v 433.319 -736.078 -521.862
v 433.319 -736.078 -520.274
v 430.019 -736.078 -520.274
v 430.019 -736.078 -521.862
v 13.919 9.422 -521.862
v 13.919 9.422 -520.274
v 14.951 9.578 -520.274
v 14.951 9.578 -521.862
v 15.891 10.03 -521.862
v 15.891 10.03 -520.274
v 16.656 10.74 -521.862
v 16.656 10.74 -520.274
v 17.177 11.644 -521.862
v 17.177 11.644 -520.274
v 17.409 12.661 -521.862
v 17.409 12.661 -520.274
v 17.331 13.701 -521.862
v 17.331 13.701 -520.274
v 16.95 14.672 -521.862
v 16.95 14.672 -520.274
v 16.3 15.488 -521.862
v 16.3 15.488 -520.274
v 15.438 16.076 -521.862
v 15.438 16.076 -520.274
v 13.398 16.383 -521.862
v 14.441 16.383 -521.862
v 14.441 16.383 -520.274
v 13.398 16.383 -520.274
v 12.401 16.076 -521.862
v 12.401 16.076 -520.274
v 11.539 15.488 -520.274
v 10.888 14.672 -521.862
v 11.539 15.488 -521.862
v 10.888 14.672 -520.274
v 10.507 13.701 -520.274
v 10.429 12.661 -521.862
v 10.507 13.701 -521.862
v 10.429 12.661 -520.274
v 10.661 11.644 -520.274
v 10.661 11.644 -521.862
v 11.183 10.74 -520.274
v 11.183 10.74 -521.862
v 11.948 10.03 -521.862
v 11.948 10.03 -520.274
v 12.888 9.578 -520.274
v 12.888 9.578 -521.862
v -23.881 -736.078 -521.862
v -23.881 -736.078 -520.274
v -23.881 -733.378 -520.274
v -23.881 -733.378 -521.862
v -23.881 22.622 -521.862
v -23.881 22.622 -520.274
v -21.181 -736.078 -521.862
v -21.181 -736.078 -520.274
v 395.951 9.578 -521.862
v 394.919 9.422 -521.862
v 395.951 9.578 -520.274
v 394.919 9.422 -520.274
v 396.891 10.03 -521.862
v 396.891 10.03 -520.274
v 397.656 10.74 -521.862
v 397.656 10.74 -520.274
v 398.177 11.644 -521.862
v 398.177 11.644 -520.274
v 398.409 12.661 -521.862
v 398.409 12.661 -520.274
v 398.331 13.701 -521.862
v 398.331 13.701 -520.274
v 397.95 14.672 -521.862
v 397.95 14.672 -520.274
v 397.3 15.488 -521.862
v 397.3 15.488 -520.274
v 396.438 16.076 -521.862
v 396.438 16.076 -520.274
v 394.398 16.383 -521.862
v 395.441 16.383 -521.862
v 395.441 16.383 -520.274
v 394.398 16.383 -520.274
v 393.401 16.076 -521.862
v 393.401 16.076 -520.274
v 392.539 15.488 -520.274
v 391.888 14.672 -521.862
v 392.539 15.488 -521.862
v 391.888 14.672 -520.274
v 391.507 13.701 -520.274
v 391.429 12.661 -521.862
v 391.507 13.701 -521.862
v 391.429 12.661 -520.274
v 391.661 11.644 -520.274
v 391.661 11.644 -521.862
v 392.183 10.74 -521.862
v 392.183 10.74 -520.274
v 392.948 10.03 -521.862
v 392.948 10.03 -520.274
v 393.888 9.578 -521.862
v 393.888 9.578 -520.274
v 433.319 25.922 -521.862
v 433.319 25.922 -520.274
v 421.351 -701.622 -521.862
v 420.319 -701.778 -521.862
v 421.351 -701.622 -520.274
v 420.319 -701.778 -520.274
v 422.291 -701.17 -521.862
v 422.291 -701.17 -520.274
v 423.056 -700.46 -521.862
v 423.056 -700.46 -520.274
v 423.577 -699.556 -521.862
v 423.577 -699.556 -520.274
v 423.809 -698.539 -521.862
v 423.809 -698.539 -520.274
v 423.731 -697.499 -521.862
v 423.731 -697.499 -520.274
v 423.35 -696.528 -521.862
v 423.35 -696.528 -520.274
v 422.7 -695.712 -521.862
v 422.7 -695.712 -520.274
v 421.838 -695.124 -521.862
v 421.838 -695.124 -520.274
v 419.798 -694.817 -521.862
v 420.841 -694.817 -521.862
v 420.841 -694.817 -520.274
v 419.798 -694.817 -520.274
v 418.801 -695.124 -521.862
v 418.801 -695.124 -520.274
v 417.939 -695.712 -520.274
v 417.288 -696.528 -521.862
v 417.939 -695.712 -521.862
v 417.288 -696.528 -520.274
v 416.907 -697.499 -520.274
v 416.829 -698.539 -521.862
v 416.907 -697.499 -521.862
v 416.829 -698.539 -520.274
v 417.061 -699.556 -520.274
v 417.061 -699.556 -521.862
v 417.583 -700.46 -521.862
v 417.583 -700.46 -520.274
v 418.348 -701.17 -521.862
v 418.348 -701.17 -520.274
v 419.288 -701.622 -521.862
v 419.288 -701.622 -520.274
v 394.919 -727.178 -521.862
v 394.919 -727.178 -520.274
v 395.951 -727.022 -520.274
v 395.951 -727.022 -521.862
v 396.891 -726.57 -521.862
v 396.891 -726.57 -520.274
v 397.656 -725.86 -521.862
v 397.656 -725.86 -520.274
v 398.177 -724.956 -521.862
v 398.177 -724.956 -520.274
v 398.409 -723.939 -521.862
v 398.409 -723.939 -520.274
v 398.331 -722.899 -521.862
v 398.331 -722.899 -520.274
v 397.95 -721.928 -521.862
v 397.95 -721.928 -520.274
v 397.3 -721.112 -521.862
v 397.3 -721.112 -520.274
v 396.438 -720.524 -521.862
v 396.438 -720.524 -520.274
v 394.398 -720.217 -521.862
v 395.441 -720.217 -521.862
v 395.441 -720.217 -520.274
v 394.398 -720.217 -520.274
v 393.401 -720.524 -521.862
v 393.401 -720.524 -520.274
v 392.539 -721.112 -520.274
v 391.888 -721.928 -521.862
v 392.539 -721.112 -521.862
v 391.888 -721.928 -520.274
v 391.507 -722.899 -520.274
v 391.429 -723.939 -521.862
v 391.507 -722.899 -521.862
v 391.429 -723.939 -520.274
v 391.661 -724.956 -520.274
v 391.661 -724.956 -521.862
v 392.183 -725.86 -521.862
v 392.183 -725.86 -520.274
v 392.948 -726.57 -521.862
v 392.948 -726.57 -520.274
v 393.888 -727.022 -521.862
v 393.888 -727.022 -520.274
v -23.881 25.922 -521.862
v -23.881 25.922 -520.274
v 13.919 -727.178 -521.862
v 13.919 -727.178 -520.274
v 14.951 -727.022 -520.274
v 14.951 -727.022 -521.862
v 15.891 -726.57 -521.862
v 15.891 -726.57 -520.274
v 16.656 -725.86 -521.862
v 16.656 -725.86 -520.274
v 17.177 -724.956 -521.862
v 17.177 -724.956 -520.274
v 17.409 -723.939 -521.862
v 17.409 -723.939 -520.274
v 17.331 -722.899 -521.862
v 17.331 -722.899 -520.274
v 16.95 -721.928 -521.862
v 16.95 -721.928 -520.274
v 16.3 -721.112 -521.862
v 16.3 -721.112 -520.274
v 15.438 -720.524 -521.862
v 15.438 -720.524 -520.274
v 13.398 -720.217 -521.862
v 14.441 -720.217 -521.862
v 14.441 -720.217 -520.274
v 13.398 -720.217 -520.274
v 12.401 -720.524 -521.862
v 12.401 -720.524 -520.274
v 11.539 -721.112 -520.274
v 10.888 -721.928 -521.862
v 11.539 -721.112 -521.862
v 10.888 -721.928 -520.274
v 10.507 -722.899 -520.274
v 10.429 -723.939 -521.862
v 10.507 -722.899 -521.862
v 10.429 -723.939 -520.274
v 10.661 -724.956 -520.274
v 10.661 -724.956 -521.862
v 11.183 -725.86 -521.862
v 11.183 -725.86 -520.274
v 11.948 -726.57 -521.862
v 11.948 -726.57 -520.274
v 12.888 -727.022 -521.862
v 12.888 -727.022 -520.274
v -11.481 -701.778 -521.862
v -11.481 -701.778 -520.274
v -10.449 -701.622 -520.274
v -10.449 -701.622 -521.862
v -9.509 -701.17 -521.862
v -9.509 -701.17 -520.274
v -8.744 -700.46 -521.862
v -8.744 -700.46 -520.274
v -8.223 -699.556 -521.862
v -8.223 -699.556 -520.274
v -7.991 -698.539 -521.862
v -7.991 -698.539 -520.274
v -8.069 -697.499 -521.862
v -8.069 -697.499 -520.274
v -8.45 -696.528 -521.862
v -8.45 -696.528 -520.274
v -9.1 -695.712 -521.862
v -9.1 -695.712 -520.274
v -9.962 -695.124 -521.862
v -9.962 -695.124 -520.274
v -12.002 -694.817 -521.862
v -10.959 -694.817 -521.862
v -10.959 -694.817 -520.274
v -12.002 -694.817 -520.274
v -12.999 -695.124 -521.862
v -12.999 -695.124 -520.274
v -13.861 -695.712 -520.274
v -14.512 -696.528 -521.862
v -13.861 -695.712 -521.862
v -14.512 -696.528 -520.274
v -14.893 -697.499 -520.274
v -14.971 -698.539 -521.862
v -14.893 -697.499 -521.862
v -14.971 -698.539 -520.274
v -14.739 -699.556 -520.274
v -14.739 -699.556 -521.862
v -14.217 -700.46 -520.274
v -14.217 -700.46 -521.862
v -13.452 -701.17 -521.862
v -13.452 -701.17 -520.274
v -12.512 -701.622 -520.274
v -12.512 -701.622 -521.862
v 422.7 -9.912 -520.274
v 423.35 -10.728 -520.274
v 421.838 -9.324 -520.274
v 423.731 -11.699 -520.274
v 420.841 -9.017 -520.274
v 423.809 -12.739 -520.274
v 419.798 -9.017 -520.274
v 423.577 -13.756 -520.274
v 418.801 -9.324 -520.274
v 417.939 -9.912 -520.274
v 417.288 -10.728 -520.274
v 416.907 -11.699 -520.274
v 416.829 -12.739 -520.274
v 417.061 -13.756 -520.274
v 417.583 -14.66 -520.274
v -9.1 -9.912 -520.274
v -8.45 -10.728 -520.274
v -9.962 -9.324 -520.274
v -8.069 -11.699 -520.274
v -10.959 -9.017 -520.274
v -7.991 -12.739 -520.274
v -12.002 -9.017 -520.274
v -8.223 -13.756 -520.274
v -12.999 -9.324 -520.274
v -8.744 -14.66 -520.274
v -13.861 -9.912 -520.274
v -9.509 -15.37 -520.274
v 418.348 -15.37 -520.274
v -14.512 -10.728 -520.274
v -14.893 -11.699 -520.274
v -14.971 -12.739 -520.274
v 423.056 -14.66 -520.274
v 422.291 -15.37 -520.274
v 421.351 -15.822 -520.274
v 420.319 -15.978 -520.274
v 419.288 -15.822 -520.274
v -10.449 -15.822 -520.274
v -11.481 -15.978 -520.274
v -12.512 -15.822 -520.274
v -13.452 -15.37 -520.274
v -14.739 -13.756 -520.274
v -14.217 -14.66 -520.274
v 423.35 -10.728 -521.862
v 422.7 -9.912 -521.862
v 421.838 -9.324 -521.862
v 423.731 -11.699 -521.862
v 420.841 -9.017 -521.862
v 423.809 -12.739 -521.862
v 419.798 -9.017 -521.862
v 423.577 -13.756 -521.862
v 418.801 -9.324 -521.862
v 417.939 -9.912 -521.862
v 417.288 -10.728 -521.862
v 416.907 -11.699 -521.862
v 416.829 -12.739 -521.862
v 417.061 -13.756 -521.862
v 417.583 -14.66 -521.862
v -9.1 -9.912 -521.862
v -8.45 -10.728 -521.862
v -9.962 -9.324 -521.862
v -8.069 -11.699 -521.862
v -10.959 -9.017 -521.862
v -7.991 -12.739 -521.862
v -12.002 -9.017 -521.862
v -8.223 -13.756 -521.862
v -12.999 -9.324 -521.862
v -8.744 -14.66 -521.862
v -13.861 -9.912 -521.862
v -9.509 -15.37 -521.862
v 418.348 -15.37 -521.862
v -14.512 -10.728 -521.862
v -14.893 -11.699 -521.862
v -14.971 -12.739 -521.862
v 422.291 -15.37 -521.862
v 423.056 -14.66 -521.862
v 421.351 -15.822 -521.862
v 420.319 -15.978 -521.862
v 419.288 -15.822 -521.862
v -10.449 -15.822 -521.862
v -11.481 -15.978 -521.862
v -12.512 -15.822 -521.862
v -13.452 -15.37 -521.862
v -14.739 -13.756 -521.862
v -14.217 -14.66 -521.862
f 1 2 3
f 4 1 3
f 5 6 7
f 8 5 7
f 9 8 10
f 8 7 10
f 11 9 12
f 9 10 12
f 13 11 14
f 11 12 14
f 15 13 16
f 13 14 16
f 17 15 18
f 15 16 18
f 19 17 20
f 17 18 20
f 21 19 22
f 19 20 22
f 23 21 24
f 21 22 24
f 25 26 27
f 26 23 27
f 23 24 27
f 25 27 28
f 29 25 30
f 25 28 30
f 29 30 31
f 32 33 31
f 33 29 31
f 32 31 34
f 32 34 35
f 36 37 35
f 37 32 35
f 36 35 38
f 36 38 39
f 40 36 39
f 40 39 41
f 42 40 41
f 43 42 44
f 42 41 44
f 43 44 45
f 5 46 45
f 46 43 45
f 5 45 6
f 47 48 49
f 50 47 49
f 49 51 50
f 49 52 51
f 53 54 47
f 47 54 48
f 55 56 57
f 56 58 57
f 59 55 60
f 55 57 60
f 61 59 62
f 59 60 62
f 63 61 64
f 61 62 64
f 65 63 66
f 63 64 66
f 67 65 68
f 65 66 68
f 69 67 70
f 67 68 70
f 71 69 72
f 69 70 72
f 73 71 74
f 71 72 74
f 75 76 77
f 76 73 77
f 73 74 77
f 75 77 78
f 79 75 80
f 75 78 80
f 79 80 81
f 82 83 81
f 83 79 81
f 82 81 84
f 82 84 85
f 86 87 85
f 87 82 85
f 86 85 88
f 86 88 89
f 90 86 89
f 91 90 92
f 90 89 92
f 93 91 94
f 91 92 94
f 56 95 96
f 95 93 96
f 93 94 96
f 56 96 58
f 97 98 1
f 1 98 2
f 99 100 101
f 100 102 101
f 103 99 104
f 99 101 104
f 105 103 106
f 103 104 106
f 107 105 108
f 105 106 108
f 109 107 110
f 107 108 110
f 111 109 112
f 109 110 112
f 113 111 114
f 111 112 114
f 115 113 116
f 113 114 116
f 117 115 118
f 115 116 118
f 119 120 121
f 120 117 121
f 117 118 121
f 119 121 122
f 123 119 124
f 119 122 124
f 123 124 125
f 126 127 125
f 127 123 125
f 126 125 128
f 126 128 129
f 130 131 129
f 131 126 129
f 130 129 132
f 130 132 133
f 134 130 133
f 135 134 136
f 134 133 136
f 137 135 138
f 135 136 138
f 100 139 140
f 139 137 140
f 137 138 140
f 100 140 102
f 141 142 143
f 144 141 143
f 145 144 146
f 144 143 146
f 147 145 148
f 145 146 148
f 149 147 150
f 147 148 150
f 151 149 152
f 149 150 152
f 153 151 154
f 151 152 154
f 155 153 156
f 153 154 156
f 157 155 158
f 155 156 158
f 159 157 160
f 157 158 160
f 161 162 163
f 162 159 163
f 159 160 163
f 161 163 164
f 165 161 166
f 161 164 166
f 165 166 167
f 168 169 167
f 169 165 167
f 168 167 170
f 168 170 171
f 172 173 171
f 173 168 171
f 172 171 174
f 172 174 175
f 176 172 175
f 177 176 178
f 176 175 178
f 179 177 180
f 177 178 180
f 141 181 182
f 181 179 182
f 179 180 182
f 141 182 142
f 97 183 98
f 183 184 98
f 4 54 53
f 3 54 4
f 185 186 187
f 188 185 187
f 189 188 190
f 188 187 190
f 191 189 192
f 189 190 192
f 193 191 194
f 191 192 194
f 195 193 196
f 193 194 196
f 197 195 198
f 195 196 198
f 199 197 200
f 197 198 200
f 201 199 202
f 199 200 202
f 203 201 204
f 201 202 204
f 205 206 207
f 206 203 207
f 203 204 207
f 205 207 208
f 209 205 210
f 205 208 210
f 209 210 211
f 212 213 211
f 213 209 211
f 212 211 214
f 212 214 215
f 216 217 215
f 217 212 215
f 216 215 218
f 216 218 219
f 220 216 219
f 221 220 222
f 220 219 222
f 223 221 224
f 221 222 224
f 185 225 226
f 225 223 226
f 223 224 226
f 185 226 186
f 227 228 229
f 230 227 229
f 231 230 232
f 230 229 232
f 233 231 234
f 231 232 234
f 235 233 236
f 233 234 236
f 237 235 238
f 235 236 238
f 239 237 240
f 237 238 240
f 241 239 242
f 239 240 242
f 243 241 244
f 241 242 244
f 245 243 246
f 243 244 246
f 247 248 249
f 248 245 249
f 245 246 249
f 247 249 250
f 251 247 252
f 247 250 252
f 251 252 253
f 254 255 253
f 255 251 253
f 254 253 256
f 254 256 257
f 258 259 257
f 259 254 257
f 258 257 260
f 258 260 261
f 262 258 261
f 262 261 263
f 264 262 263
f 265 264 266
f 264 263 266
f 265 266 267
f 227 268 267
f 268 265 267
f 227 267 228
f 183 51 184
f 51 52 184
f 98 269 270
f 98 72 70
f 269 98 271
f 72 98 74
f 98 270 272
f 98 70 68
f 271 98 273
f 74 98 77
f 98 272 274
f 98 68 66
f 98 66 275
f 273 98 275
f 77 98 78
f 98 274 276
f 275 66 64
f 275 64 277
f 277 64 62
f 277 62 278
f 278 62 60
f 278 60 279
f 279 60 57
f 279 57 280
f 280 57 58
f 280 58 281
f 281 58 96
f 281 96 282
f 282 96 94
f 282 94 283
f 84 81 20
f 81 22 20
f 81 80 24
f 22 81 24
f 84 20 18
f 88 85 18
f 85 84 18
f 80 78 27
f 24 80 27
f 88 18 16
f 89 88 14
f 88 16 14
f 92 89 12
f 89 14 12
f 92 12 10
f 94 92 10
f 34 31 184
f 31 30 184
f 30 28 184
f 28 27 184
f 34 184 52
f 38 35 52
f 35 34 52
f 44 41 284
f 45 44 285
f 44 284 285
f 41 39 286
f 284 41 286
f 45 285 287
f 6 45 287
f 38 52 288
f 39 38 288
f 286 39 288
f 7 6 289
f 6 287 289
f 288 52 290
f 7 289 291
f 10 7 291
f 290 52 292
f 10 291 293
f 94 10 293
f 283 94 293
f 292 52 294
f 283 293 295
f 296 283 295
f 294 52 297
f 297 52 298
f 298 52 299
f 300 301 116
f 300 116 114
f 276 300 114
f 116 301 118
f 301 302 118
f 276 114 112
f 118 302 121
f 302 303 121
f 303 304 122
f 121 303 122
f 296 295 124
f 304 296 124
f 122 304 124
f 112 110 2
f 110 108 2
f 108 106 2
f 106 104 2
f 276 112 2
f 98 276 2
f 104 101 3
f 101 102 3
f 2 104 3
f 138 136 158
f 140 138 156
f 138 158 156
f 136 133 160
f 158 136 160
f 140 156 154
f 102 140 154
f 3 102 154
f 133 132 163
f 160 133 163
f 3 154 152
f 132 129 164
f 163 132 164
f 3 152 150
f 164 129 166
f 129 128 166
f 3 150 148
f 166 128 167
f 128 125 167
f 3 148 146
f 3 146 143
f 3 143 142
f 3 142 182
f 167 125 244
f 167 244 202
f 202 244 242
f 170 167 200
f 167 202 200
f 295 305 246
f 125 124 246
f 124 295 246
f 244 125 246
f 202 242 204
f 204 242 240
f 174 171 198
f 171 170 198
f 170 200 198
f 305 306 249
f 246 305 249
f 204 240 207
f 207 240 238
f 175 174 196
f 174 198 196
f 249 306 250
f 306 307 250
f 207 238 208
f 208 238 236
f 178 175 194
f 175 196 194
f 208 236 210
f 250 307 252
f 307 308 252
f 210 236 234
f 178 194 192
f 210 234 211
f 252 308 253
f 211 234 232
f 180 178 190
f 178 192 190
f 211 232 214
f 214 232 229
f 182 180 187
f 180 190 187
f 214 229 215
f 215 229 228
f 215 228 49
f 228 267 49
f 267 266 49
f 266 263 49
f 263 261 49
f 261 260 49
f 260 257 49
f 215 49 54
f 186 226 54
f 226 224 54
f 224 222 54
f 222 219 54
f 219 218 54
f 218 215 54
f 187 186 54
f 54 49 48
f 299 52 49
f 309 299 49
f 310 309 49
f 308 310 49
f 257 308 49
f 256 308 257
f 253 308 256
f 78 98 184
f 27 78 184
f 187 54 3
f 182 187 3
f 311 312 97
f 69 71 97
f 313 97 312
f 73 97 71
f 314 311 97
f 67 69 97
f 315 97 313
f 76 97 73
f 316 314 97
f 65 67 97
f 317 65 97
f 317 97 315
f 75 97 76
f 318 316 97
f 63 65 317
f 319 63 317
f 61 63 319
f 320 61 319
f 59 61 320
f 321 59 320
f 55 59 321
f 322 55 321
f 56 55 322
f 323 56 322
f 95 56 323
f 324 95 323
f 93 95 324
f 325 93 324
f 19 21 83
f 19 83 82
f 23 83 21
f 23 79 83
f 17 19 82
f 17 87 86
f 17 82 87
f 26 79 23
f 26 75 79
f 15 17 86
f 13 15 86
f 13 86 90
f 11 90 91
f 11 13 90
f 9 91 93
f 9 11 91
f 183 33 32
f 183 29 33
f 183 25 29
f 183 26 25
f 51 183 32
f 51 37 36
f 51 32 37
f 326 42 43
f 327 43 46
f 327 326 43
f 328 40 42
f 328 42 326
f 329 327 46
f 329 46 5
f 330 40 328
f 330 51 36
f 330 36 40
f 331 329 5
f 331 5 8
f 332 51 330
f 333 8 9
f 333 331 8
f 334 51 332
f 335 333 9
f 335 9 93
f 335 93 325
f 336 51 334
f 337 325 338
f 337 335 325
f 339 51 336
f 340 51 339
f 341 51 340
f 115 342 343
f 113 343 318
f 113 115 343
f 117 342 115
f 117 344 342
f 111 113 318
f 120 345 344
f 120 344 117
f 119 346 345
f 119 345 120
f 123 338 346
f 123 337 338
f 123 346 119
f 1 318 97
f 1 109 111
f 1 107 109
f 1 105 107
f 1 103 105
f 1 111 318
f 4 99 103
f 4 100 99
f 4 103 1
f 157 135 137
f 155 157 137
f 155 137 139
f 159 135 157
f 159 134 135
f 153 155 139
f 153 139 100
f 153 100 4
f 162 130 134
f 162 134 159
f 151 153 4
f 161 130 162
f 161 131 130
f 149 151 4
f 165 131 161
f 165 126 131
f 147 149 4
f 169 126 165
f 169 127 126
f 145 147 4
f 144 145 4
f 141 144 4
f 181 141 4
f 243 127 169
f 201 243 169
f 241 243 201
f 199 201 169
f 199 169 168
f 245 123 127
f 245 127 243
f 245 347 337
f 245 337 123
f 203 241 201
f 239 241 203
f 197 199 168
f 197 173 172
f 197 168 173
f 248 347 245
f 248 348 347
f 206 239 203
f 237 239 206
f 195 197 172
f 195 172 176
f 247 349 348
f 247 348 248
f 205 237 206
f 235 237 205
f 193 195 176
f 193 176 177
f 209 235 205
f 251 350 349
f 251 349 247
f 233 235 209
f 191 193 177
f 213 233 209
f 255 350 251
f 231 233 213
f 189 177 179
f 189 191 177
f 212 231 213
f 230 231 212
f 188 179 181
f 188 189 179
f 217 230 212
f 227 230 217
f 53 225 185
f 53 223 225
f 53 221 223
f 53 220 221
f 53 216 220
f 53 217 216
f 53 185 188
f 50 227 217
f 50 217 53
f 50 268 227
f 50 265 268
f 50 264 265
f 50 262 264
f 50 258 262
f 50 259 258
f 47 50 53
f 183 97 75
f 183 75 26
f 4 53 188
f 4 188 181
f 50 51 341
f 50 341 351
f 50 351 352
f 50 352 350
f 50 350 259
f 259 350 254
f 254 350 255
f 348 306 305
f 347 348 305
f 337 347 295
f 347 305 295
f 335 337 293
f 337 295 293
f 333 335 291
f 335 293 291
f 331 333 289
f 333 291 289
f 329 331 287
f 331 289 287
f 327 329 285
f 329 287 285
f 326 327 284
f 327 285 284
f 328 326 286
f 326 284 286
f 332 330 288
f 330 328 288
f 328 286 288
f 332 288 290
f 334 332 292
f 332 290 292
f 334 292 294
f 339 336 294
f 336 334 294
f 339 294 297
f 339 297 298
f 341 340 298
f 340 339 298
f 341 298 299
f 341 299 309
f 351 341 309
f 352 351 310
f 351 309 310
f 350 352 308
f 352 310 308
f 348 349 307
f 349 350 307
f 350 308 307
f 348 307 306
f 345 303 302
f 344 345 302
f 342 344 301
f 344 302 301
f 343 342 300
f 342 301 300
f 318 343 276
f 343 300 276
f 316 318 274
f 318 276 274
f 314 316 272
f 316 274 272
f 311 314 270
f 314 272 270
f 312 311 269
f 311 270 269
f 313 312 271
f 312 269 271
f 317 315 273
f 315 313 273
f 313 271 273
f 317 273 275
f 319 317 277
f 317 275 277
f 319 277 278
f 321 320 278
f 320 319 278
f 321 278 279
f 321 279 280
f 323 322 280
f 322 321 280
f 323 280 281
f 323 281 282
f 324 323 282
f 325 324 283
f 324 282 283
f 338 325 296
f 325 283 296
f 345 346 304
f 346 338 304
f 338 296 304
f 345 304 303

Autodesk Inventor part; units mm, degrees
ref_plane "YZ Plane" through (0, 0, 0) normal (1, 0, 0) x (0, 1, 0)
ref_plane "XZ Plane" through (0, 0, 0) normal (0, 1, 0) x (-1, 0, 0)
ref_plane "XY Plane" through (0, 0, 0) normal (0, 0, 1) x (1, 0, 0)
ref_plane "Work Plane1" through (204.4192, -355.3778, -520.2745) normal (0, 0, -1) x (0, -1, 0)
sketch "Sketch1" plane through (204.4192, -355.3778, -520.2745) normal (0, 0, -1) x (0, -1, 0)
  line L0 (355.8032, 202.9143) -> (355.8032, -203.4857) projected
  line L1 (380.7, 225.6) -> (380.7, -225.6) projected
  line L2 (-378, 228.3) -> (378, 228.3) projected
  circle A0 centre (368.3, 190.5) radius 3.5 projected
  circle A1 centre (342.9, 215.9) radius 3.5 projected
  circle A2 centre (368.3, -190.5) radius 3.5 projected
  circle A3 centre (342.9, -215.9) radius 3.5 projected
  circle A4 centre (-342.9, -215.9) radius 3.5 projected
  circle A5 centre (-368.3, -190.5) radius 3.5 projected
  circle A6 centre (-368.3, 190.5) radius 3.5 projected
  circle A7 centre (-342.9, 215.9) radius 3.5 projected
  line L3 (380.7, 228.3) -> (-381.3, 228.3)
  line L4 (-381.3, 228.3) -> (-381.3, -228.9)
  line L5 (-381.3, -228.9) -> (380.7, -228.9)
  line L6 (380.7, -228.9) -> (380.7, 228.3)
  point P0 (-355.3778, 204.4192)
  dimension "d0" = 762
  dimension "d1" = 457.2
extrude "Extrusion1" add sketch "Sketch1" along normal blind 1.5875
properties part number "vrRig_v8_enclosure_topPanel"
